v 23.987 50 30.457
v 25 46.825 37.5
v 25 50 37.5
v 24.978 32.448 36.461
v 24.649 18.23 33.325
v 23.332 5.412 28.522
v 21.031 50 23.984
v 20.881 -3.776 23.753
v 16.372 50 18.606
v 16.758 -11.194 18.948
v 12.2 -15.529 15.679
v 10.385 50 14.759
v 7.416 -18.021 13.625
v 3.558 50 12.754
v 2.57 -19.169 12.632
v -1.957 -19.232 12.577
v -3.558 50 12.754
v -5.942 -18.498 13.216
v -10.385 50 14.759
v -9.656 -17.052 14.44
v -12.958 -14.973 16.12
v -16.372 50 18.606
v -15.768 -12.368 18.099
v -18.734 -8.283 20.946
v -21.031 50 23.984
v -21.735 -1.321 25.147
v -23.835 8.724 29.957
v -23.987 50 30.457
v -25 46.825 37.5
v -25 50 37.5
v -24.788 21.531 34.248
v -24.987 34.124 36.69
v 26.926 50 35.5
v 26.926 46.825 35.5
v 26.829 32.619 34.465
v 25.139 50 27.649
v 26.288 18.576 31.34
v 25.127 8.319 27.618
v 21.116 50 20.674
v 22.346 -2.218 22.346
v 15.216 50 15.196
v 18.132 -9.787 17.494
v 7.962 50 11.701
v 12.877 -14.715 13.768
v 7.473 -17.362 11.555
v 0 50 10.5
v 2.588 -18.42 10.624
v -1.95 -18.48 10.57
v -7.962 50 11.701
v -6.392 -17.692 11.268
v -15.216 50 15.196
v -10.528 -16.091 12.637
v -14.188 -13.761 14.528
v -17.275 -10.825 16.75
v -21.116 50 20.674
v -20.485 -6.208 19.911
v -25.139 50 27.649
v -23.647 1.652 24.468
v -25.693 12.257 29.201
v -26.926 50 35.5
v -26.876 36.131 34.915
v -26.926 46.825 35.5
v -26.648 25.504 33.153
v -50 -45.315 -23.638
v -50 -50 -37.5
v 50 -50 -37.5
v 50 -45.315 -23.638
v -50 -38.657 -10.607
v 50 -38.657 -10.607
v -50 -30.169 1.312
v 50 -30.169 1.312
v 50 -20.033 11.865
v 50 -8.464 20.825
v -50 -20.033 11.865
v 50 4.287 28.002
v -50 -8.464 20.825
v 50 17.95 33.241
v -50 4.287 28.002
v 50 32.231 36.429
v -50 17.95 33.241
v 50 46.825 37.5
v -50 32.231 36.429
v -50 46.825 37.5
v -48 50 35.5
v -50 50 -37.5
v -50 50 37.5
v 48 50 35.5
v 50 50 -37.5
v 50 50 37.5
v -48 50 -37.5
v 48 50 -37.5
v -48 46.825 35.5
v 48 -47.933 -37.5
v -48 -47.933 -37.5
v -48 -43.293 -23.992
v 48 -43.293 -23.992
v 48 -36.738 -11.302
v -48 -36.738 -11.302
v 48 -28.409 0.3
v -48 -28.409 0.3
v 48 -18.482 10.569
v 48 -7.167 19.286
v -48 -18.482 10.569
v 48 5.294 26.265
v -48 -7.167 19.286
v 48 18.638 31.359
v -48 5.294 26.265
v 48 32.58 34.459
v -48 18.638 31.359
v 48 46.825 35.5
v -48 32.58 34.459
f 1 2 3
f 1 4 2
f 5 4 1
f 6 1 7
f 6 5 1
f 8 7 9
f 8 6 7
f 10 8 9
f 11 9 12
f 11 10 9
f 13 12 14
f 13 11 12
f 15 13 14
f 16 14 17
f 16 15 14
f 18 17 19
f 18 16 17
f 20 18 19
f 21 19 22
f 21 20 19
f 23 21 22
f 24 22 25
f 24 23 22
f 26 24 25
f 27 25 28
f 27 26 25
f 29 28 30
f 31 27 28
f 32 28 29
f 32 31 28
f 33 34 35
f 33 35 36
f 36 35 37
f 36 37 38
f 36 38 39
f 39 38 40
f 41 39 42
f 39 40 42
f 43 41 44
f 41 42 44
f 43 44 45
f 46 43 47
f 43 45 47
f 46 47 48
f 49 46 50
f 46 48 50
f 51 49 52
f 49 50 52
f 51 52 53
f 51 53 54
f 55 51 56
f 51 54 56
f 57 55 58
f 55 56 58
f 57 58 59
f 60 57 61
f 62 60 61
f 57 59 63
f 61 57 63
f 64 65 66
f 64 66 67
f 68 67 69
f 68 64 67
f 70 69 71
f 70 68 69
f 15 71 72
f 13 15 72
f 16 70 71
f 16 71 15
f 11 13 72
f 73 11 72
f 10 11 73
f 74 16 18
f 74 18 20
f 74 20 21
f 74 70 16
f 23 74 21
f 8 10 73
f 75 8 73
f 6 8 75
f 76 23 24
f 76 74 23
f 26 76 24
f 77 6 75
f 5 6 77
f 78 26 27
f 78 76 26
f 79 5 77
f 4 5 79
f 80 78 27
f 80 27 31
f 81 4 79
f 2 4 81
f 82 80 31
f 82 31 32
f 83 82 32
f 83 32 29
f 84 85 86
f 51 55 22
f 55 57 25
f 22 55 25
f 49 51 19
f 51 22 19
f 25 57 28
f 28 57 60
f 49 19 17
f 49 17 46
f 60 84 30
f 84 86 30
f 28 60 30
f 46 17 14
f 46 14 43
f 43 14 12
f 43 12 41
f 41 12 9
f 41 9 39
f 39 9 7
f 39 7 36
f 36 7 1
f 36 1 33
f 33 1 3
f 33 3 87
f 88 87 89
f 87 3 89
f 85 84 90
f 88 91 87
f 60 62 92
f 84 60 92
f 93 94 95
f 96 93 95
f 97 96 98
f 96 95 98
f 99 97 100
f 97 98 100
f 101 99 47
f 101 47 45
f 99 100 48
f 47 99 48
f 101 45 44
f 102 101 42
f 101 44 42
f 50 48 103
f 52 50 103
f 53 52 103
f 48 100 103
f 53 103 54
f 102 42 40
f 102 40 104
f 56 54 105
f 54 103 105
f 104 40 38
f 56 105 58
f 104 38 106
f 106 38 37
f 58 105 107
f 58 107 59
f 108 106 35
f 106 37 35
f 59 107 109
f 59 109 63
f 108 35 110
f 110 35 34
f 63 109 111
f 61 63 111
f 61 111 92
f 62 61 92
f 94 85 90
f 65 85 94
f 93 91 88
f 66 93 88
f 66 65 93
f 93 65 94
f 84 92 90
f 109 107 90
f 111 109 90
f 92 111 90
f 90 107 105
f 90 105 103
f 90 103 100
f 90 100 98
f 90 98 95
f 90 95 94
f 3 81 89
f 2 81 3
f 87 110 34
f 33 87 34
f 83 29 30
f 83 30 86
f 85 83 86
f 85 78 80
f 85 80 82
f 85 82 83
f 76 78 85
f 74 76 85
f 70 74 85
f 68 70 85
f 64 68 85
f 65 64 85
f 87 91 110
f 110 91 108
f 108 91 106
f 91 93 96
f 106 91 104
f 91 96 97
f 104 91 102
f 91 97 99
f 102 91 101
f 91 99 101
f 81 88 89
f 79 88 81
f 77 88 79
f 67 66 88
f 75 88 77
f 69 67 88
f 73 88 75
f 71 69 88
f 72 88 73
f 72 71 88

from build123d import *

# Parameters (mm, degrees)
F1_DEPTH    = 50
F2_T1_DEPTH = 509.1229182759
F3_T        = -2


# Not quite as in the source:
# - a fillet or chamfer that OpenCascade refuses, or shapes differently, is made with other operations: its cross-section is extruded or revolved along the edge and cut away or added


with BuildPart() as f1:
    # F0 (on Front) → F1 (new body, symmetric)
    with BuildSketch(Plane.XZ):
        with BuildLine():
            Line((50, -37.5), (50, 37.5))
            Line((50, 37.5), (25, 37.5))
            ThreePointArc((25, 37.5), (0, 12.5), (-25, 37.5))
            Line((-25, 37.5), (-50, 37.5))
            Line((-50, 37.5), (-50, -37.5))
            Line((-50, -37.5), (50, -37.5))
        make_face()
    extrude(amount=F1_DEPTH, both=True)

    # F2: fillet of radius 100 on 1 edges, made by hand

    # F2_s2 → F2_t1 (cut)
    with BuildSketch(Plane.YZ.offset(-217.061459138)):
        with BuildLine():
            ThreePointArc((-50, -37.5), (-14.4126599144, 16.5569415042), (46.8245836552, 37.5))
            Line((46.8245836552, 37.5), (-50, 37.5))
            Line((-50, 37.5), (-50, -37.5))
        make_face()
    extrude(amount=F2_T1_DEPTH, mode=Mode.SUBTRACT)

    # F3
    f3_openings = [f1.faces().sort_by_distance(p)[0] for p in [
        (0, 50, -4.049992),
        (0, 0, -37.5),
    ]]
    offset(amount=F3_T, openings=f3_openings, kind=Kind.INTERSECTION)


solid = f1.part
